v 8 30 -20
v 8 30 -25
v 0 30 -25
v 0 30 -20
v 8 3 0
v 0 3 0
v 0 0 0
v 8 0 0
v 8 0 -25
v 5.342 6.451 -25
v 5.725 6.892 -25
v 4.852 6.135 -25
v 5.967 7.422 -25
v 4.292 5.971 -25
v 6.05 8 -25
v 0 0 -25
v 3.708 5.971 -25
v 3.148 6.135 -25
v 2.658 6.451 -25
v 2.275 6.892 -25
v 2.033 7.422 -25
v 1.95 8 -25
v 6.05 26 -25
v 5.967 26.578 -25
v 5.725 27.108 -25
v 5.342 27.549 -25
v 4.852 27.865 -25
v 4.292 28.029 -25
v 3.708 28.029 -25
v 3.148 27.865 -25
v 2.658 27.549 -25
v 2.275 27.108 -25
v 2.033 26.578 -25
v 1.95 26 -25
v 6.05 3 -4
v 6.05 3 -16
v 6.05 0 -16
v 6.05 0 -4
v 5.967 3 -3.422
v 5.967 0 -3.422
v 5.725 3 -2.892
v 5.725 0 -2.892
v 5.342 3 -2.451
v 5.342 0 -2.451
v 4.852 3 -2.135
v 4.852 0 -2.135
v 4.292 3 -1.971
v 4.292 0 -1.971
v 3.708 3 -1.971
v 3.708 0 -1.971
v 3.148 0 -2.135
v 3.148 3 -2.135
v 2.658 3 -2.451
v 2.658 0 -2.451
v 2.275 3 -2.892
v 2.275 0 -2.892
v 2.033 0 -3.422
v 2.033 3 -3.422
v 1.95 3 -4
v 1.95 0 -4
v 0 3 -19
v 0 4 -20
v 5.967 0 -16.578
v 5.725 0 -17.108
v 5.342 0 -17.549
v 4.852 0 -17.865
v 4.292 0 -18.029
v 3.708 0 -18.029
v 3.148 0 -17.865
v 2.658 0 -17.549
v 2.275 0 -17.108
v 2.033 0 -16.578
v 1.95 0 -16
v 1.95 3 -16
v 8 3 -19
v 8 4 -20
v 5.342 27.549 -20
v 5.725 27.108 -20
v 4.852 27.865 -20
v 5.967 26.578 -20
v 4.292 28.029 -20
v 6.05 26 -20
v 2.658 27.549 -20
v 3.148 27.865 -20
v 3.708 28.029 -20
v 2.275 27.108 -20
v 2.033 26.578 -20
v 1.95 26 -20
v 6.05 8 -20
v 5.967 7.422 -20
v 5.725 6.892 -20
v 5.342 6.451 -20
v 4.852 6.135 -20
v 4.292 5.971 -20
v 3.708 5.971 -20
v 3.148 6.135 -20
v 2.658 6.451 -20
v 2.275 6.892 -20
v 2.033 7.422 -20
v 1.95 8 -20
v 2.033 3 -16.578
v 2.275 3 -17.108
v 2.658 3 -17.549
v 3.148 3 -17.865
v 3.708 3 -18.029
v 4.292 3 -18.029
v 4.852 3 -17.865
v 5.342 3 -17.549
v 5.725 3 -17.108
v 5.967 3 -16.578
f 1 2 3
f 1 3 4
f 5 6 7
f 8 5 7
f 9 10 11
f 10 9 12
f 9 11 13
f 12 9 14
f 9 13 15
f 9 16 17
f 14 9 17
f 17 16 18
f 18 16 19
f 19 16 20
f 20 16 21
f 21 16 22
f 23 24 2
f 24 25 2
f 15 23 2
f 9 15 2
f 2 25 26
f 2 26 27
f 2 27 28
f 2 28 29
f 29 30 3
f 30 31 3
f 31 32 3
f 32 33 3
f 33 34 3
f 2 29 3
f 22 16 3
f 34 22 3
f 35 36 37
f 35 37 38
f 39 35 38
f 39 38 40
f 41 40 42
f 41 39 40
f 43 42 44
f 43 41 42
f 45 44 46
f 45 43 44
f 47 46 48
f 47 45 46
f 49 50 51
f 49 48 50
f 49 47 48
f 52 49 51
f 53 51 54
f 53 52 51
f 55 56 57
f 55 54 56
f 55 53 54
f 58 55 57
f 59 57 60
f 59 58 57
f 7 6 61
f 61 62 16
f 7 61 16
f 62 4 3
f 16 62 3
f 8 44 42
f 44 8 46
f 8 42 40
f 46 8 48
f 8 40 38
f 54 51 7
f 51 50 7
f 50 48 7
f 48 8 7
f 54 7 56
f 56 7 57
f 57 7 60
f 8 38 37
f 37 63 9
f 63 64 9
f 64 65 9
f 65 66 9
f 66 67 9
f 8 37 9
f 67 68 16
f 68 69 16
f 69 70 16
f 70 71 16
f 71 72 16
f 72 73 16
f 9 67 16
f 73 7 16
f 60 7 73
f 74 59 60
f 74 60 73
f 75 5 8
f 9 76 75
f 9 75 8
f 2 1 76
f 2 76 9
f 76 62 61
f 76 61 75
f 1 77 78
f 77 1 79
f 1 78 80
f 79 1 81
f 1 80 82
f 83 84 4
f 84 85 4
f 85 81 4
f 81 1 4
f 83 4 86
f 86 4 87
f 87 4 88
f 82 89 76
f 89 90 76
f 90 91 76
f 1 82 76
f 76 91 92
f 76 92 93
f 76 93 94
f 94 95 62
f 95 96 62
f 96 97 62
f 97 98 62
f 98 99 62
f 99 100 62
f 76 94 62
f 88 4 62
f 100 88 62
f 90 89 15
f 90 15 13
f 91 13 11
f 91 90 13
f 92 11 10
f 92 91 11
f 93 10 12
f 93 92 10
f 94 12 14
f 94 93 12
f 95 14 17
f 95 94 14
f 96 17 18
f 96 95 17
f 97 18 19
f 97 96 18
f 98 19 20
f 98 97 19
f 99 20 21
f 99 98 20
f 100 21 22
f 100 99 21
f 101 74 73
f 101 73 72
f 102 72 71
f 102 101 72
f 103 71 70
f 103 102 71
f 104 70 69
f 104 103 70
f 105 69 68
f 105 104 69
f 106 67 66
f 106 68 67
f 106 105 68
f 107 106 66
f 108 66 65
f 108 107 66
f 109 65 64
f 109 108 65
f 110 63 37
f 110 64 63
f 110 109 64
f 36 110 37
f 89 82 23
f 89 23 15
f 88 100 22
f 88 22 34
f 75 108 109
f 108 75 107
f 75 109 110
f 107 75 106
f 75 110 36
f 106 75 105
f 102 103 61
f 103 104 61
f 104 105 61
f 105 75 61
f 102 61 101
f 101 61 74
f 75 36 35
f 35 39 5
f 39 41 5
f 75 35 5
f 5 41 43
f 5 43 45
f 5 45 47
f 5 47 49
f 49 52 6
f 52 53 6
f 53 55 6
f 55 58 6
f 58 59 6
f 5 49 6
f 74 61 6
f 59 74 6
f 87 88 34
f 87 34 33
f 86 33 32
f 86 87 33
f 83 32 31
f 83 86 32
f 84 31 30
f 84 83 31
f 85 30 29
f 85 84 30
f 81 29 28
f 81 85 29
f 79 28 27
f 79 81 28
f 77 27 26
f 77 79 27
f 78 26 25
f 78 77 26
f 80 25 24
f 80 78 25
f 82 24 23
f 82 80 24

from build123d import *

# Parameters (mm, degrees)
BOSS_EXTRUDE1_DEPTH = 8
CUT_EXTRUDE1_DEPTH  = 8
CUT_EXTRUDE2_DEPTH  = 8
CHAMFER1_SIZE       = 1


with BuildPart() as part:
    # Sketch1 → Boss-Extrude1 (new body)
    with BuildSketch(Plane(origin=(0, 0, 0), x_dir=(0, 0, -1), z_dir=(1, 0, 0))):
        Polygon((0, 0), (25, 0), (25, 30), (20, 30), (20, 3), (0, 3), align=None)
    extrude(amount=BOSS_EXTRUDE1_DEPTH)

    # Sketch3 → Cut-Extrude1 (cut)
    with BuildSketch(Plane(origin=(0, 3, 0), x_dir=(1, 0, 0), z_dir=(0, 1, 0))):
        with BuildLine():
            Line((1.95, 4), (1.95, 16))
            ThreePointArc((1.95, 16), (4, 18.05), (6.05, 16))
            Line((6.05, 16), (6.05, 4))
            ThreePointArc((6.05, 4), (4, 1.95), (1.95, 4))
        make_face()
    extrude(amount=-CUT_EXTRUDE1_DEPTH, mode=Mode.SUBTRACT)

    # Sketch4 → Cut-Extrude2 (cut)
    with BuildSketch(Plane.XY.offset(-20)):
        with BuildLine():
            Line((6.05, 26), (6.05, 8))
            ThreePointArc((6.05, 8), (4, 5.95), (1.95, 8))
            Line((1.95, 8), (1.95, 26))
            ThreePointArc((1.95, 26), (4, 28.05), (6.05, 26))
        make_face()
    extrude(amount=-CUT_EXTRUDE2_DEPTH, mode=Mode.SUBTRACT)

    # Chamfer1
    chamfer1_edges = [part.edges().sort_by_distance(p)[0] for p in [
        (4, 3, -20),
    ]]
    chamfer(chamfer1_edges, length=CHAMFER1_SIZE)


solid = part.part
